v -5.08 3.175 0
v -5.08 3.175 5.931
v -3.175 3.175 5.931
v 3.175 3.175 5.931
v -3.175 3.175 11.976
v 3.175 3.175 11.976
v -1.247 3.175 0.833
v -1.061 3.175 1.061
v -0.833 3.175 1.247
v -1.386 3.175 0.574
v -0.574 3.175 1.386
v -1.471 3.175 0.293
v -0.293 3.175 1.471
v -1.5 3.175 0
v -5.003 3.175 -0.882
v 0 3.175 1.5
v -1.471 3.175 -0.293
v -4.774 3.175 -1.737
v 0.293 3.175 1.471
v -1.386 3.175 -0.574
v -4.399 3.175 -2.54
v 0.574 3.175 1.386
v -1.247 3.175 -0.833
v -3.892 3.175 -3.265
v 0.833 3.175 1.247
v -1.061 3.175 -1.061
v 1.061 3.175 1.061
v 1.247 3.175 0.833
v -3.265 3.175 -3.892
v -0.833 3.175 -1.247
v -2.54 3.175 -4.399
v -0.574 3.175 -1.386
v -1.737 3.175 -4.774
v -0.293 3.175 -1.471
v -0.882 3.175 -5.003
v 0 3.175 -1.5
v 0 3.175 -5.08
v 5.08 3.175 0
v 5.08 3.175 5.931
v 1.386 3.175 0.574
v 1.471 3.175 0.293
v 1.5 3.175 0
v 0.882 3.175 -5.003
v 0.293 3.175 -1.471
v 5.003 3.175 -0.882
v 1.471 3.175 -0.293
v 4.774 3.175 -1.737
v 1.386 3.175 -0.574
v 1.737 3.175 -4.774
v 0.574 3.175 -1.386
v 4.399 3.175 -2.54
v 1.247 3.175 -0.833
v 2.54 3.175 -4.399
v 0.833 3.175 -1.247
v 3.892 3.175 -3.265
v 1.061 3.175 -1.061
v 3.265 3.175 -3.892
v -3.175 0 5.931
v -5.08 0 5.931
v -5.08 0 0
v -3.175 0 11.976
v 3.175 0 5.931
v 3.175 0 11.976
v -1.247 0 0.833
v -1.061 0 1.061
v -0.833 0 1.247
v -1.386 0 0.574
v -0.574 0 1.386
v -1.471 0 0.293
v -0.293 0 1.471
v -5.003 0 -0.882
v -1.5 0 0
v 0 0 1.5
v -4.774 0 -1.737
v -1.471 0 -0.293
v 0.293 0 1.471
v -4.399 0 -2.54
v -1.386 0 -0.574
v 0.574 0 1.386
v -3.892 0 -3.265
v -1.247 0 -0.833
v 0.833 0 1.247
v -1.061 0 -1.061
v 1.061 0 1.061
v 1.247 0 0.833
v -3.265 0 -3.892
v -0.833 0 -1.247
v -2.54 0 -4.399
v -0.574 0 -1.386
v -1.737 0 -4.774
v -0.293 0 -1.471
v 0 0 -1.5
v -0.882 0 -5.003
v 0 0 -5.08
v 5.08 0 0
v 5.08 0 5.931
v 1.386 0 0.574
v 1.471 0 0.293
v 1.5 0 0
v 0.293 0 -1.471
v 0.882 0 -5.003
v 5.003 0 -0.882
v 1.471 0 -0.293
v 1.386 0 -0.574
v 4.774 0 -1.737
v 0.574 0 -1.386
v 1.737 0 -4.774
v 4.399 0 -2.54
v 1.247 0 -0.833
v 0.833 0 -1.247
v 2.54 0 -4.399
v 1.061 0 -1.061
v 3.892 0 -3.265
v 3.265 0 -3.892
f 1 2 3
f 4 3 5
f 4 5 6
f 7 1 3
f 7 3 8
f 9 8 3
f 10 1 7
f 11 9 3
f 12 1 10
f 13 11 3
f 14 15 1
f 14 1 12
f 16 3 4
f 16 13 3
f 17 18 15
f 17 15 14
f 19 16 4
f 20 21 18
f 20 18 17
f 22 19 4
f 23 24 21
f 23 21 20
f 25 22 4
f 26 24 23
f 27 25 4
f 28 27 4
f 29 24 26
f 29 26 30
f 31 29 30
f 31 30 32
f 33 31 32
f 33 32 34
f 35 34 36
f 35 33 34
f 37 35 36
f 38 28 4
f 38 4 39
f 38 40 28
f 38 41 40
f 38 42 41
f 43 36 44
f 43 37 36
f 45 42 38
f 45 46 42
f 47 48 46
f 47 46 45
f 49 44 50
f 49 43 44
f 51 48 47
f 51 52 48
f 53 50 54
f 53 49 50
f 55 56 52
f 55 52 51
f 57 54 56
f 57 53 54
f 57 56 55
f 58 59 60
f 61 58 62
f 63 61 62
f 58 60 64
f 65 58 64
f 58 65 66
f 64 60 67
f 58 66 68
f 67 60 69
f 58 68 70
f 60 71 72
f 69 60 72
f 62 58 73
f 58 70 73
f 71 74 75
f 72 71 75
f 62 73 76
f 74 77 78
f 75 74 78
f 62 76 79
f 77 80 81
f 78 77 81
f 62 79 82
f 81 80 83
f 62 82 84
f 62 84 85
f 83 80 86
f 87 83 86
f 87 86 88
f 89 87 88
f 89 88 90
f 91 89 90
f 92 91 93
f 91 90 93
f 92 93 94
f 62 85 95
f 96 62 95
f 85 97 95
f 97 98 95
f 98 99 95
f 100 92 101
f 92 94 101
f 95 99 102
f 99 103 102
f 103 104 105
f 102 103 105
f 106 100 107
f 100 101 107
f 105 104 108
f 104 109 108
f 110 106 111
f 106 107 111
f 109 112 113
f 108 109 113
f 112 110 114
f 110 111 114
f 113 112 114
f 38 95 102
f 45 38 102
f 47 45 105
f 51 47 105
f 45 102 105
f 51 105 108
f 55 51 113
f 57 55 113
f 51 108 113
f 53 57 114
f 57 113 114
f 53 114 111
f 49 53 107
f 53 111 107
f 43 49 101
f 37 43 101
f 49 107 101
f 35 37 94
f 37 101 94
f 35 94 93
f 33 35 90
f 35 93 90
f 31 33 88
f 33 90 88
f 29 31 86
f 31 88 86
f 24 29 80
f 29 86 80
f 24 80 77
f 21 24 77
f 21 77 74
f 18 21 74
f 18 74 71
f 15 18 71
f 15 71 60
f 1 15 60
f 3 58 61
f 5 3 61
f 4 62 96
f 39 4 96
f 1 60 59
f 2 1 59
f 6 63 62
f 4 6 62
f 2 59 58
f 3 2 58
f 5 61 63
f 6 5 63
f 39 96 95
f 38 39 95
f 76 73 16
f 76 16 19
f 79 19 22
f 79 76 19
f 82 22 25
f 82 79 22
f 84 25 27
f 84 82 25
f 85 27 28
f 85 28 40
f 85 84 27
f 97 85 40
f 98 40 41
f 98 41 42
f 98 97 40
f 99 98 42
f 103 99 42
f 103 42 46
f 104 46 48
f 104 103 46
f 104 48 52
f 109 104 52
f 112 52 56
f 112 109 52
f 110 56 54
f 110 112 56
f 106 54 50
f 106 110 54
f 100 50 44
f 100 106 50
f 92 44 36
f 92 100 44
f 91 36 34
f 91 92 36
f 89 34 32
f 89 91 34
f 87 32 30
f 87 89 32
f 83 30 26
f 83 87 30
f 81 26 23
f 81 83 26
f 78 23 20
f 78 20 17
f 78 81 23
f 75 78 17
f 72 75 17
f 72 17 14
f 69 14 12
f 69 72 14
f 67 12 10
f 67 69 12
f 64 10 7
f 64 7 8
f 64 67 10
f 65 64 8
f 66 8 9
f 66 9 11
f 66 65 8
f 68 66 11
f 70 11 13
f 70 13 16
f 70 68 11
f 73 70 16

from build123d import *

# Parameters (mm, degrees)
SKETCH1_R           = 1.5
BOSS_EXTRUDE1_DEPTH = 3.175


with BuildPart() as part:
    # Sketch1 → Boss-Extrude1 (new body)
    with BuildSketch(Plane(origin=(0, 0, 0), x_dir=(1, 0, 0), z_dir=(0, 1, 0))):
        with BuildLine():
            Line((-5.08, 0), (-5.08, -5.9309))
            Line((-5.08, -5.9309), (-3.175, -5.9309))
            Line((-3.175, -5.9309), (-3.175, -11.9761))
            Line((-3.175, -11.9761), (3.175, -11.9761))
            Line((3.175, -11.9761), (3.175, -5.9309))
            Line((3.175, -5.9309), (5.08, -5.9309))
            Line((5.08, -5.9309), (5.08, 0))
            ThreePointArc((5.08, 0), (0, 5.08), (-5.08, 0))
        make_face()
        with Locations(Location((0, 0, 0), (0, 0, 270))):
            Circle(SKETCH1_R, mode=Mode.SUBTRACT)
    extrude(amount=BOSS_EXTRUDE1_DEPTH)


solid = part.part
